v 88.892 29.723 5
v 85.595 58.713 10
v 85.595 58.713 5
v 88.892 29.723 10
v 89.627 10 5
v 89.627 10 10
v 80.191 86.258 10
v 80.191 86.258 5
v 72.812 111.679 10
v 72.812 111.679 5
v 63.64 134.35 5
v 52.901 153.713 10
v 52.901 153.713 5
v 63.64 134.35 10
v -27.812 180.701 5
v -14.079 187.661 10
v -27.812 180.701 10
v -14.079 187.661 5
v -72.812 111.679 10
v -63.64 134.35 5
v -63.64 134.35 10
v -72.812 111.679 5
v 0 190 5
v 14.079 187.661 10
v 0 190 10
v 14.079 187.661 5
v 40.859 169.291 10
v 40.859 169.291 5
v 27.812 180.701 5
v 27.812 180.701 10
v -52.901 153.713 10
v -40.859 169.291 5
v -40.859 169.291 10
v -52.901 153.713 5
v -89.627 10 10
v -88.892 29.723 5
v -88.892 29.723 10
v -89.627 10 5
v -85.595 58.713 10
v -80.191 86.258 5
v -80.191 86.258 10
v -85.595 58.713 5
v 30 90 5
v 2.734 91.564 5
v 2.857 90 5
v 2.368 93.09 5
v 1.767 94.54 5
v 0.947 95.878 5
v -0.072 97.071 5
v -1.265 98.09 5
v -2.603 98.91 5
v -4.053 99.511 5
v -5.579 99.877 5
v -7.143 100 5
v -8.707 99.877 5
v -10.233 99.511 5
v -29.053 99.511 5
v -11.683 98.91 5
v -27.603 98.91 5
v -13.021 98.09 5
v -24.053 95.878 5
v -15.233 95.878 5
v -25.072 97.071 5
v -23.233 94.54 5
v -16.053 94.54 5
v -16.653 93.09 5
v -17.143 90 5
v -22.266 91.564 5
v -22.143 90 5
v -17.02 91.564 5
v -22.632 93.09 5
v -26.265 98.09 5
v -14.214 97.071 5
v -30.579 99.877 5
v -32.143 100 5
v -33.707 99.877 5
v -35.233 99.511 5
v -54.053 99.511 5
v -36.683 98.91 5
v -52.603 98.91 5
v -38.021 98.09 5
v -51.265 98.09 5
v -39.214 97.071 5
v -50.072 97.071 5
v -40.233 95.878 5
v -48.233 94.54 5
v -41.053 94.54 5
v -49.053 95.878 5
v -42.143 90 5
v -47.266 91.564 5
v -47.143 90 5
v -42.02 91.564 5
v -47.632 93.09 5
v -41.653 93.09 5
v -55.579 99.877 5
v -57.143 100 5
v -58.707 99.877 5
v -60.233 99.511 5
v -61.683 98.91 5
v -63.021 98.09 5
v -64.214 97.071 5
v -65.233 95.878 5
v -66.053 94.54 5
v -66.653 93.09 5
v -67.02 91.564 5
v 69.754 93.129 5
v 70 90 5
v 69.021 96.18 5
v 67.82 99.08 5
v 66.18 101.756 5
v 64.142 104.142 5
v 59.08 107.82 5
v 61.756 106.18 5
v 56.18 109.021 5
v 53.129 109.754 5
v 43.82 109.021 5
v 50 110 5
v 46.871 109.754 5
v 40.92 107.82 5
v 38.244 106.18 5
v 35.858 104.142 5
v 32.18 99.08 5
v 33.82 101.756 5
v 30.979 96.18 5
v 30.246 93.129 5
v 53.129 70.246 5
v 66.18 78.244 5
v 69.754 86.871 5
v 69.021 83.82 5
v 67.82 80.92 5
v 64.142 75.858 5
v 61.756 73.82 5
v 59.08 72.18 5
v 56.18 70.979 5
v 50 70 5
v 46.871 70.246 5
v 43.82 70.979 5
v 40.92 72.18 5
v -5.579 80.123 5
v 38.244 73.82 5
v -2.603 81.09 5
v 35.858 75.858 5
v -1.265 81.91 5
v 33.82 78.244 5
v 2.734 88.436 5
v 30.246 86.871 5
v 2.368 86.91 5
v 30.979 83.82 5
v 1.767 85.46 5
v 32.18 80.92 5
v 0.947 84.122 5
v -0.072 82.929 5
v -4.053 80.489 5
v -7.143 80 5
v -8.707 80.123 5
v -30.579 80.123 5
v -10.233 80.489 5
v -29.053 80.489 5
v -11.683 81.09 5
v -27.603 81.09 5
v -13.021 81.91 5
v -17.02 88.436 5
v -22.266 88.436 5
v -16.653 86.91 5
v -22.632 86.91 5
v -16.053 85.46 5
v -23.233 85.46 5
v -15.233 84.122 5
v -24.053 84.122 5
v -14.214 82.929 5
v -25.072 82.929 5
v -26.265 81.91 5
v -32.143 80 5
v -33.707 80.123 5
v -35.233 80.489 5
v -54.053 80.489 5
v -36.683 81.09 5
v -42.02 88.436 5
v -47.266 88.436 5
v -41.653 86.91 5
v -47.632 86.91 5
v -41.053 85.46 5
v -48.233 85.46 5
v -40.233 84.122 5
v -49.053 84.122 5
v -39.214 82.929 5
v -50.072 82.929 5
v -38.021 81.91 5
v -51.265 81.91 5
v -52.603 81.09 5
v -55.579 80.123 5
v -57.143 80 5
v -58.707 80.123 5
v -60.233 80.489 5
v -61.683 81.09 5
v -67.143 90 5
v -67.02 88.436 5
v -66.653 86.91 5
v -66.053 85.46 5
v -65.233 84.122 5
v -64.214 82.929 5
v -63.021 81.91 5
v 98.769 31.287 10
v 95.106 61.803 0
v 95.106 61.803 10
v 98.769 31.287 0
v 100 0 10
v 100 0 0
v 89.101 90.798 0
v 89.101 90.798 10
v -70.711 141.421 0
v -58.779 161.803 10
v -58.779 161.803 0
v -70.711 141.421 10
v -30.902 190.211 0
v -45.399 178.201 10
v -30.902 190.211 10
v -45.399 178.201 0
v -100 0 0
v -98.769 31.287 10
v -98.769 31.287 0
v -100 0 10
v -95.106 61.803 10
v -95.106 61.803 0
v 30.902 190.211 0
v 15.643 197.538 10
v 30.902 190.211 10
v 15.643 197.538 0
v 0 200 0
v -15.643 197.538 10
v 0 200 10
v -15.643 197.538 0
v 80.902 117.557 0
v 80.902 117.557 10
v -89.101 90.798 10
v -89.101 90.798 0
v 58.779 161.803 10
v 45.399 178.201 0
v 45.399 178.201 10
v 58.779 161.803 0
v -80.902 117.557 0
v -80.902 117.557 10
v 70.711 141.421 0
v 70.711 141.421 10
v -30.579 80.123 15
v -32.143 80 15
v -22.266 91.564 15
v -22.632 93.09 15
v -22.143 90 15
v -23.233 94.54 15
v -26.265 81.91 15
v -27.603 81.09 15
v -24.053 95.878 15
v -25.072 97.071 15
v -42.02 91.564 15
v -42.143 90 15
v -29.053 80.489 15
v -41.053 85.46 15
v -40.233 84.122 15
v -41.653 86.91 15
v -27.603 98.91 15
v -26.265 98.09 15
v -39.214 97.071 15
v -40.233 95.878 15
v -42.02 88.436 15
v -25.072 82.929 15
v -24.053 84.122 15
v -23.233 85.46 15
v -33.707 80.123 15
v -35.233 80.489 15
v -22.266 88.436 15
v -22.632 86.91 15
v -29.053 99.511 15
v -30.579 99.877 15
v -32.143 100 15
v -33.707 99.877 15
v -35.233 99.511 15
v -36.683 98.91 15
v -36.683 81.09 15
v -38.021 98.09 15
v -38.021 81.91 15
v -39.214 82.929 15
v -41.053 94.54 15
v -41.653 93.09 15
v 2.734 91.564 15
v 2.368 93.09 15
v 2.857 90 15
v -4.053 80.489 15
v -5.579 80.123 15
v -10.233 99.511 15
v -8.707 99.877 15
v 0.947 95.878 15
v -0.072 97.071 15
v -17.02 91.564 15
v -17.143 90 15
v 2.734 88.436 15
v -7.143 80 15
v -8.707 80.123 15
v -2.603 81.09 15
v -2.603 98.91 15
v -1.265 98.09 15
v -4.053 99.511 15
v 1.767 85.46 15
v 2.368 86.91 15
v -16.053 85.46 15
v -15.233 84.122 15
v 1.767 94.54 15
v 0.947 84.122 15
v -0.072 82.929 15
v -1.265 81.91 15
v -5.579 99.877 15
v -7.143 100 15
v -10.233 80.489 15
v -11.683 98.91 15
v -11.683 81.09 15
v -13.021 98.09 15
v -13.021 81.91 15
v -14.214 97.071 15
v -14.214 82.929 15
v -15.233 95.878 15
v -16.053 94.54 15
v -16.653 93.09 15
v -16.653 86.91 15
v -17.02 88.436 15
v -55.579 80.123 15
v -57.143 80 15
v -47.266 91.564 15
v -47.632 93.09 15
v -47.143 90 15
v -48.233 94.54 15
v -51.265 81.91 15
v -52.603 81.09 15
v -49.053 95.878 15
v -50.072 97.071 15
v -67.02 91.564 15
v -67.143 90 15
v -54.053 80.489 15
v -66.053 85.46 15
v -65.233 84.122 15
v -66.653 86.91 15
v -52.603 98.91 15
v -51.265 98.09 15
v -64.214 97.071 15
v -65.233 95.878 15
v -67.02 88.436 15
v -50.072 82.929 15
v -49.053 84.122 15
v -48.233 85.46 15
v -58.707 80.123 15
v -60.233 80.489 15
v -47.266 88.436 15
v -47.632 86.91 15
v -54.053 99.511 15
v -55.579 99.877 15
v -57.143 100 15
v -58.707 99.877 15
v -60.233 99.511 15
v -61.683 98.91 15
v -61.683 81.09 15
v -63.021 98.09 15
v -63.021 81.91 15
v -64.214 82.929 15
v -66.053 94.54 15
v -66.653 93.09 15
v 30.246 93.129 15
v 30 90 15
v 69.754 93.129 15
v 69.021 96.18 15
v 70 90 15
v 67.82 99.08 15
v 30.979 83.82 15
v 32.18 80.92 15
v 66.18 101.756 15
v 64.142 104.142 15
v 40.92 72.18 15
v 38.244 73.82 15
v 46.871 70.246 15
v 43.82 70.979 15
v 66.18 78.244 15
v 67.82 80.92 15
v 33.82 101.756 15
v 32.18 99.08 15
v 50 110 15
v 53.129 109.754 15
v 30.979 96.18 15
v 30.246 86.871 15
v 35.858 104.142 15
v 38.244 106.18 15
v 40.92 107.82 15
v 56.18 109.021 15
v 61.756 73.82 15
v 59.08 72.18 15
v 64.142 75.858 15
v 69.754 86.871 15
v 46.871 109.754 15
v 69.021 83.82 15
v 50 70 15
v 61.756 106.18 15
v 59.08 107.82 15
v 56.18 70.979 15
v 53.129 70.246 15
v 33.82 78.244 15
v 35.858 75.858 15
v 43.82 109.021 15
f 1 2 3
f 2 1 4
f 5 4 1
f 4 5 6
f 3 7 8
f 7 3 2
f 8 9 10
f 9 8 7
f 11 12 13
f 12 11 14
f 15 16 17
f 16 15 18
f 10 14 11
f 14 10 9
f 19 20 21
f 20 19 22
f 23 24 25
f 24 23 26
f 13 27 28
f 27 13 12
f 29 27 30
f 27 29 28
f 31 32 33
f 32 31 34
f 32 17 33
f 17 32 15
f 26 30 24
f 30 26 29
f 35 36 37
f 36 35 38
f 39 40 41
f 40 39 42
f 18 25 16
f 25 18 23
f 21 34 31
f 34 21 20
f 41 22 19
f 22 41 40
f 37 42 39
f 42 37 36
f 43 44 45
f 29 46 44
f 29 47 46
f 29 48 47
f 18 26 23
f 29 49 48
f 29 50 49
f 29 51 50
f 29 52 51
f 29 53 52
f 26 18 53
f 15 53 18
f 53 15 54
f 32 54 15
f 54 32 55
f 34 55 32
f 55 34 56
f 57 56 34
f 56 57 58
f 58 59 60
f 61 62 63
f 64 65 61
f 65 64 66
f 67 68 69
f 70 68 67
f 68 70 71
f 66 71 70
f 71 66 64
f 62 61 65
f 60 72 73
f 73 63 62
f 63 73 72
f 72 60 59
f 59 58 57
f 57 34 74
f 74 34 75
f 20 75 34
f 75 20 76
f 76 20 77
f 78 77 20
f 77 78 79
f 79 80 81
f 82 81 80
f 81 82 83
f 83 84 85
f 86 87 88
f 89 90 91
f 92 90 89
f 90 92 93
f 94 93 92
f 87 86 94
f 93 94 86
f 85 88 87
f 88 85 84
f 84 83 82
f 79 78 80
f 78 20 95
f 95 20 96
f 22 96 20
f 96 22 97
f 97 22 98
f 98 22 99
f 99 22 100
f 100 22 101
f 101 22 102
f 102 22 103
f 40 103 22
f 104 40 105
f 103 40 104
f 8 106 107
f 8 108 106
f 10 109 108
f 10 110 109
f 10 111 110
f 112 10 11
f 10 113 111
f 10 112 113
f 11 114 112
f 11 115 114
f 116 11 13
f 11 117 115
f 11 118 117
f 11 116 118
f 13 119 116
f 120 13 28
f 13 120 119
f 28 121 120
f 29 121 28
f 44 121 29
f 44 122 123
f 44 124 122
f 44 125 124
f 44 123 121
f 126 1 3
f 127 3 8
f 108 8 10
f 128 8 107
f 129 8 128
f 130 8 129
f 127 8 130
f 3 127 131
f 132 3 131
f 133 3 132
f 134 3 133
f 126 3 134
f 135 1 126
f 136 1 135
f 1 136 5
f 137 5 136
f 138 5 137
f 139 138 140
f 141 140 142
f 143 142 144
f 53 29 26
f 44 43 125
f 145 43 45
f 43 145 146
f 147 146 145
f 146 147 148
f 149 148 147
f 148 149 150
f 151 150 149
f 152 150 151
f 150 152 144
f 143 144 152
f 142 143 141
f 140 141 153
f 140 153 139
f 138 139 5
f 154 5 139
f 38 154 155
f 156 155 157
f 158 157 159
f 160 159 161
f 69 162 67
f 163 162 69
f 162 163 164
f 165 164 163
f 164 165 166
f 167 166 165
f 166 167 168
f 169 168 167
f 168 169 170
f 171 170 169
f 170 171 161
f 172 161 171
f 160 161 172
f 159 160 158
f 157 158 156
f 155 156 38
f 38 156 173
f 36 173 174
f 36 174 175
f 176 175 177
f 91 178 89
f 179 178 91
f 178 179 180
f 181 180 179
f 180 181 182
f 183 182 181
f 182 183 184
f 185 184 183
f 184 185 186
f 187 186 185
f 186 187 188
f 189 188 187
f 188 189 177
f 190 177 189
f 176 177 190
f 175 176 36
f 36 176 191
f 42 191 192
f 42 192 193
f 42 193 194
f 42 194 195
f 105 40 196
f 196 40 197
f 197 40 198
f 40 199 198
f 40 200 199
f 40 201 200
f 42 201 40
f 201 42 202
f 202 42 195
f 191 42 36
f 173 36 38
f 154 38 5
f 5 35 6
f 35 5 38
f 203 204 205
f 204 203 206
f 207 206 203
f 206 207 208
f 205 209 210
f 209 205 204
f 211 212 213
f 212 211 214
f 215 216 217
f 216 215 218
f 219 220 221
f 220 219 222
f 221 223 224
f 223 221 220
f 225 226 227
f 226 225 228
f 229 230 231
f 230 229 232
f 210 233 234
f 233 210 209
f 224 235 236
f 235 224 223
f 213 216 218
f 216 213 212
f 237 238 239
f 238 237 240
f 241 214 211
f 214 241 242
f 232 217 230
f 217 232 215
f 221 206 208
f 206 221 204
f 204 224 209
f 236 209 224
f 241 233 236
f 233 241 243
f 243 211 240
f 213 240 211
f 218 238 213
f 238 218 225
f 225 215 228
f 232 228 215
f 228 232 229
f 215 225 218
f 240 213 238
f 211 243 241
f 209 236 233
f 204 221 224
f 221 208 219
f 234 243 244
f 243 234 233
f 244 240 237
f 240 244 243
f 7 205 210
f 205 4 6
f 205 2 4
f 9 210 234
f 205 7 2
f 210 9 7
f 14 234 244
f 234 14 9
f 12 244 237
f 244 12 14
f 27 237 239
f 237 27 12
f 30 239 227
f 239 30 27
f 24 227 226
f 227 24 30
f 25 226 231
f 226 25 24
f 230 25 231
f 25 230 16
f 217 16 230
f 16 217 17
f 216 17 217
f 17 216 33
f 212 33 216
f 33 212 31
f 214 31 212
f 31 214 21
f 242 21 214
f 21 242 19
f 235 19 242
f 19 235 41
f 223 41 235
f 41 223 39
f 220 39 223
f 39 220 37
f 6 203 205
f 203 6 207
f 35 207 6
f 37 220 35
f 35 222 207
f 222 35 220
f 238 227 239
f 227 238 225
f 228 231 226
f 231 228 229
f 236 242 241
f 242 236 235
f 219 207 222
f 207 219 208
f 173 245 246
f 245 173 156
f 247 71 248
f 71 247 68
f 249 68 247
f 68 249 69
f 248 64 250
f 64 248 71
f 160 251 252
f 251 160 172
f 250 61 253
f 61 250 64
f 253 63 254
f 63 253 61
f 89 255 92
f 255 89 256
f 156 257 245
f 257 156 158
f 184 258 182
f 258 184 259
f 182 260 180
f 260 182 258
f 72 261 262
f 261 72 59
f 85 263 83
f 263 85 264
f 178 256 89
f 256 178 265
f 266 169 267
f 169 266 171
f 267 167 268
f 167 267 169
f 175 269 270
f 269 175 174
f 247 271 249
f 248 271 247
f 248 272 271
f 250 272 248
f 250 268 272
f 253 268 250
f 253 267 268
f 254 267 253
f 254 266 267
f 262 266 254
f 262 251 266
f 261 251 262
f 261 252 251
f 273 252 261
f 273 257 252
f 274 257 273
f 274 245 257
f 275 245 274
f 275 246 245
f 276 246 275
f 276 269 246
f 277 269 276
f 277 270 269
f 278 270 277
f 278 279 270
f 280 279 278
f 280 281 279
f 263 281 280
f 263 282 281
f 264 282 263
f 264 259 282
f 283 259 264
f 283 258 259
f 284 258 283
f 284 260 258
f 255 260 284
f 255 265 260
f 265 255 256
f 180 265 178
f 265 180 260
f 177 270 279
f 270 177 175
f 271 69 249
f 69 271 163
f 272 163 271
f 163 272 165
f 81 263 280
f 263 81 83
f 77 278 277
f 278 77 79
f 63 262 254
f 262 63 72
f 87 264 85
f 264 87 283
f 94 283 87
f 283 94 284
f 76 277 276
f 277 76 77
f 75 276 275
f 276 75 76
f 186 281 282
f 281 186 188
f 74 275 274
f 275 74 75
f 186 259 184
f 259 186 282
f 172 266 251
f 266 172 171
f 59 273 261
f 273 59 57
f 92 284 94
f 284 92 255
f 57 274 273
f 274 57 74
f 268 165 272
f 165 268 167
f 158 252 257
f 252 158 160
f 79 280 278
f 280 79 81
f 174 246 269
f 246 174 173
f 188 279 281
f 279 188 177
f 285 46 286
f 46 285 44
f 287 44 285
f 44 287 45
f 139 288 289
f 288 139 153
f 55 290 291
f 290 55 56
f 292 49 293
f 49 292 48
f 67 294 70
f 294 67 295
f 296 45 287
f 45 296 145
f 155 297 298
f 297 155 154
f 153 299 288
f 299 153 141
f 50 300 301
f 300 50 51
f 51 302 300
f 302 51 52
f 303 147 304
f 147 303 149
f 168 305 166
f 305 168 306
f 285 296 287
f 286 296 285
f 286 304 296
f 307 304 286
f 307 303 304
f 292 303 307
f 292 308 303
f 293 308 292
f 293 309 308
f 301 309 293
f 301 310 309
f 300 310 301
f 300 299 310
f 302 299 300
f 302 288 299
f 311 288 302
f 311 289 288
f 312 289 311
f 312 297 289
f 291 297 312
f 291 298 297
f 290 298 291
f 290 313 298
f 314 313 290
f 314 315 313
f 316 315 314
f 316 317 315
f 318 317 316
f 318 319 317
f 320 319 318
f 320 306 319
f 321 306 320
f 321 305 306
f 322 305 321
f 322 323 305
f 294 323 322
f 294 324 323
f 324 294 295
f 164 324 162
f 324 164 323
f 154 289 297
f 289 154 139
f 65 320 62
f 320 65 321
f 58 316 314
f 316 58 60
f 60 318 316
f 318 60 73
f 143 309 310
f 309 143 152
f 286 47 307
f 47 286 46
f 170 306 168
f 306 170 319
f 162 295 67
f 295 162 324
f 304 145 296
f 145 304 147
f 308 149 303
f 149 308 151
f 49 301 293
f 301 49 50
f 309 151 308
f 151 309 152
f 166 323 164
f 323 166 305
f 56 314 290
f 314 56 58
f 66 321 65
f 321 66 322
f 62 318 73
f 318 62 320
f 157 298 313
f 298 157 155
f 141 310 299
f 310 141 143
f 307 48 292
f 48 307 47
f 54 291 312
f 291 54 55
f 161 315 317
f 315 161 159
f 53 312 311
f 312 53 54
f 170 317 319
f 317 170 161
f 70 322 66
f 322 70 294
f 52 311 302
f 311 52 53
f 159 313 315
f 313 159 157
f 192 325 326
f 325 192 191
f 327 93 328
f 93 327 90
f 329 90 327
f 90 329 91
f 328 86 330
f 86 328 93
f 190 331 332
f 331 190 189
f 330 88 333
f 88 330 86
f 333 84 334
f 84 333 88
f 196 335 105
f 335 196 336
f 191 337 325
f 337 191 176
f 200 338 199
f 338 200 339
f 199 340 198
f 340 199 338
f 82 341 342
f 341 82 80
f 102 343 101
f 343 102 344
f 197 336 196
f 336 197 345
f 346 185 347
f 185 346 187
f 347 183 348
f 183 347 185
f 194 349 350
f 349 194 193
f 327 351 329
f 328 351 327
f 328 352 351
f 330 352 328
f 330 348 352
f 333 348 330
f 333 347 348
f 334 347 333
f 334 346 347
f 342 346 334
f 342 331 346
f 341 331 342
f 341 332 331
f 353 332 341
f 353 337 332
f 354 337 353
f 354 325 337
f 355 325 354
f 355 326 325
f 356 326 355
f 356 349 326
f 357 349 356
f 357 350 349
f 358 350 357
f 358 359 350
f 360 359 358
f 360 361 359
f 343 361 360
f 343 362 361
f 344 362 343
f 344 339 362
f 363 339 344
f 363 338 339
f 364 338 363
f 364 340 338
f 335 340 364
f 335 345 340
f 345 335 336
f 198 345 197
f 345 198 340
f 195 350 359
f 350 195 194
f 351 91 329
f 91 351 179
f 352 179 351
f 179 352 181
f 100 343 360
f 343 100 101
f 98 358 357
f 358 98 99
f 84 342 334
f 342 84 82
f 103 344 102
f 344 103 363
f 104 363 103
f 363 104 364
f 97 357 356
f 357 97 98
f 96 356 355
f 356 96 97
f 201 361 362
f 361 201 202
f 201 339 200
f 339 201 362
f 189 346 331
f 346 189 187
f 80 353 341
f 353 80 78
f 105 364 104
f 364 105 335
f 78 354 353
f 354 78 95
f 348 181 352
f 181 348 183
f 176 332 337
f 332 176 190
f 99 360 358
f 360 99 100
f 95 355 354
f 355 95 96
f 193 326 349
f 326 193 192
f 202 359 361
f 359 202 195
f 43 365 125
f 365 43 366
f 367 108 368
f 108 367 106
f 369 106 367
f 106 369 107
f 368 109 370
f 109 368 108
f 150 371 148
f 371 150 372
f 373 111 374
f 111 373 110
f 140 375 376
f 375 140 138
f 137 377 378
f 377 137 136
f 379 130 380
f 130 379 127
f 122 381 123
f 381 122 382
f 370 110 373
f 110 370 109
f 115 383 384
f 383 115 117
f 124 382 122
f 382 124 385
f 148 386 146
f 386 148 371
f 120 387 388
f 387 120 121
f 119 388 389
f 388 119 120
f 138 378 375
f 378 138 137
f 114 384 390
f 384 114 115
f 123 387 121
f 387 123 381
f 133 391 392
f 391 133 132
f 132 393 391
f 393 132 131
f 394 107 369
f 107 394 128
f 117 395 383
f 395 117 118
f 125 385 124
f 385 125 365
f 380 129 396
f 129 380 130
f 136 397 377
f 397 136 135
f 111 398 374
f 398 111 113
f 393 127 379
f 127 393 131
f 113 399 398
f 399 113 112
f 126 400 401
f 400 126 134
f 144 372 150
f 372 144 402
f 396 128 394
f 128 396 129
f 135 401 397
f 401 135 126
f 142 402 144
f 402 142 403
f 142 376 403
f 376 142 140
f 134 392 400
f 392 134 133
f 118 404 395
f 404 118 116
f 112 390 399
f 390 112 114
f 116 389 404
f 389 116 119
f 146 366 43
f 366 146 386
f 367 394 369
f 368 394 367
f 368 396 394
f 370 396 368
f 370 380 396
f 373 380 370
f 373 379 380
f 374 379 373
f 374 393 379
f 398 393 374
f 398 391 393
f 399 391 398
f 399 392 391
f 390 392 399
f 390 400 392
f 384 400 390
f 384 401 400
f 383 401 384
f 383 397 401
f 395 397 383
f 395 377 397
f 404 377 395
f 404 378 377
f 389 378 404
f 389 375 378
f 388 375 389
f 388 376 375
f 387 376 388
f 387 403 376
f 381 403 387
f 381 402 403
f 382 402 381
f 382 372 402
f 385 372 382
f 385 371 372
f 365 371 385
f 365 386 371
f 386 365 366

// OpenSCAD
/*
    speederbike dashboard
*/

LENGTH = 200;
WIDTH = 200;
HEIGHT = 10;

$fn=40;

difference(){
    resize([0,400,0]){
        cylinder(r=200/2,h=HEIGHT);
    }
    
    // border
    translate([0,0,5]){
        difference(){
            resize([180,380,0]){
                cylinder(r=200/2,h=HEIGHT);
            }
            translate([-90,-190,-1]){
                cube([180,200,HEIGHT+2]);
            }
        }
    }
    
    translate([-100,-200,-1]){
        cube([200,200,HEIGHT+2]);
    }
}

// big knob
translate([LENGTH/4,(WIDTH/2)-10,HEIGHT/2]){
    cylinder(r=20,h=10);
}

// little knobs
translate([-LENGTH/3.5,(WIDTH/2)-10,HEIGHT/2]){
    cylinder(r=10,h=10);
    translate([25,0,0]){
        cylinder(r=10,h=10);
        translate([25,0,0]){
            cylinder(r=10,h=10);
        }
    }
}
    
